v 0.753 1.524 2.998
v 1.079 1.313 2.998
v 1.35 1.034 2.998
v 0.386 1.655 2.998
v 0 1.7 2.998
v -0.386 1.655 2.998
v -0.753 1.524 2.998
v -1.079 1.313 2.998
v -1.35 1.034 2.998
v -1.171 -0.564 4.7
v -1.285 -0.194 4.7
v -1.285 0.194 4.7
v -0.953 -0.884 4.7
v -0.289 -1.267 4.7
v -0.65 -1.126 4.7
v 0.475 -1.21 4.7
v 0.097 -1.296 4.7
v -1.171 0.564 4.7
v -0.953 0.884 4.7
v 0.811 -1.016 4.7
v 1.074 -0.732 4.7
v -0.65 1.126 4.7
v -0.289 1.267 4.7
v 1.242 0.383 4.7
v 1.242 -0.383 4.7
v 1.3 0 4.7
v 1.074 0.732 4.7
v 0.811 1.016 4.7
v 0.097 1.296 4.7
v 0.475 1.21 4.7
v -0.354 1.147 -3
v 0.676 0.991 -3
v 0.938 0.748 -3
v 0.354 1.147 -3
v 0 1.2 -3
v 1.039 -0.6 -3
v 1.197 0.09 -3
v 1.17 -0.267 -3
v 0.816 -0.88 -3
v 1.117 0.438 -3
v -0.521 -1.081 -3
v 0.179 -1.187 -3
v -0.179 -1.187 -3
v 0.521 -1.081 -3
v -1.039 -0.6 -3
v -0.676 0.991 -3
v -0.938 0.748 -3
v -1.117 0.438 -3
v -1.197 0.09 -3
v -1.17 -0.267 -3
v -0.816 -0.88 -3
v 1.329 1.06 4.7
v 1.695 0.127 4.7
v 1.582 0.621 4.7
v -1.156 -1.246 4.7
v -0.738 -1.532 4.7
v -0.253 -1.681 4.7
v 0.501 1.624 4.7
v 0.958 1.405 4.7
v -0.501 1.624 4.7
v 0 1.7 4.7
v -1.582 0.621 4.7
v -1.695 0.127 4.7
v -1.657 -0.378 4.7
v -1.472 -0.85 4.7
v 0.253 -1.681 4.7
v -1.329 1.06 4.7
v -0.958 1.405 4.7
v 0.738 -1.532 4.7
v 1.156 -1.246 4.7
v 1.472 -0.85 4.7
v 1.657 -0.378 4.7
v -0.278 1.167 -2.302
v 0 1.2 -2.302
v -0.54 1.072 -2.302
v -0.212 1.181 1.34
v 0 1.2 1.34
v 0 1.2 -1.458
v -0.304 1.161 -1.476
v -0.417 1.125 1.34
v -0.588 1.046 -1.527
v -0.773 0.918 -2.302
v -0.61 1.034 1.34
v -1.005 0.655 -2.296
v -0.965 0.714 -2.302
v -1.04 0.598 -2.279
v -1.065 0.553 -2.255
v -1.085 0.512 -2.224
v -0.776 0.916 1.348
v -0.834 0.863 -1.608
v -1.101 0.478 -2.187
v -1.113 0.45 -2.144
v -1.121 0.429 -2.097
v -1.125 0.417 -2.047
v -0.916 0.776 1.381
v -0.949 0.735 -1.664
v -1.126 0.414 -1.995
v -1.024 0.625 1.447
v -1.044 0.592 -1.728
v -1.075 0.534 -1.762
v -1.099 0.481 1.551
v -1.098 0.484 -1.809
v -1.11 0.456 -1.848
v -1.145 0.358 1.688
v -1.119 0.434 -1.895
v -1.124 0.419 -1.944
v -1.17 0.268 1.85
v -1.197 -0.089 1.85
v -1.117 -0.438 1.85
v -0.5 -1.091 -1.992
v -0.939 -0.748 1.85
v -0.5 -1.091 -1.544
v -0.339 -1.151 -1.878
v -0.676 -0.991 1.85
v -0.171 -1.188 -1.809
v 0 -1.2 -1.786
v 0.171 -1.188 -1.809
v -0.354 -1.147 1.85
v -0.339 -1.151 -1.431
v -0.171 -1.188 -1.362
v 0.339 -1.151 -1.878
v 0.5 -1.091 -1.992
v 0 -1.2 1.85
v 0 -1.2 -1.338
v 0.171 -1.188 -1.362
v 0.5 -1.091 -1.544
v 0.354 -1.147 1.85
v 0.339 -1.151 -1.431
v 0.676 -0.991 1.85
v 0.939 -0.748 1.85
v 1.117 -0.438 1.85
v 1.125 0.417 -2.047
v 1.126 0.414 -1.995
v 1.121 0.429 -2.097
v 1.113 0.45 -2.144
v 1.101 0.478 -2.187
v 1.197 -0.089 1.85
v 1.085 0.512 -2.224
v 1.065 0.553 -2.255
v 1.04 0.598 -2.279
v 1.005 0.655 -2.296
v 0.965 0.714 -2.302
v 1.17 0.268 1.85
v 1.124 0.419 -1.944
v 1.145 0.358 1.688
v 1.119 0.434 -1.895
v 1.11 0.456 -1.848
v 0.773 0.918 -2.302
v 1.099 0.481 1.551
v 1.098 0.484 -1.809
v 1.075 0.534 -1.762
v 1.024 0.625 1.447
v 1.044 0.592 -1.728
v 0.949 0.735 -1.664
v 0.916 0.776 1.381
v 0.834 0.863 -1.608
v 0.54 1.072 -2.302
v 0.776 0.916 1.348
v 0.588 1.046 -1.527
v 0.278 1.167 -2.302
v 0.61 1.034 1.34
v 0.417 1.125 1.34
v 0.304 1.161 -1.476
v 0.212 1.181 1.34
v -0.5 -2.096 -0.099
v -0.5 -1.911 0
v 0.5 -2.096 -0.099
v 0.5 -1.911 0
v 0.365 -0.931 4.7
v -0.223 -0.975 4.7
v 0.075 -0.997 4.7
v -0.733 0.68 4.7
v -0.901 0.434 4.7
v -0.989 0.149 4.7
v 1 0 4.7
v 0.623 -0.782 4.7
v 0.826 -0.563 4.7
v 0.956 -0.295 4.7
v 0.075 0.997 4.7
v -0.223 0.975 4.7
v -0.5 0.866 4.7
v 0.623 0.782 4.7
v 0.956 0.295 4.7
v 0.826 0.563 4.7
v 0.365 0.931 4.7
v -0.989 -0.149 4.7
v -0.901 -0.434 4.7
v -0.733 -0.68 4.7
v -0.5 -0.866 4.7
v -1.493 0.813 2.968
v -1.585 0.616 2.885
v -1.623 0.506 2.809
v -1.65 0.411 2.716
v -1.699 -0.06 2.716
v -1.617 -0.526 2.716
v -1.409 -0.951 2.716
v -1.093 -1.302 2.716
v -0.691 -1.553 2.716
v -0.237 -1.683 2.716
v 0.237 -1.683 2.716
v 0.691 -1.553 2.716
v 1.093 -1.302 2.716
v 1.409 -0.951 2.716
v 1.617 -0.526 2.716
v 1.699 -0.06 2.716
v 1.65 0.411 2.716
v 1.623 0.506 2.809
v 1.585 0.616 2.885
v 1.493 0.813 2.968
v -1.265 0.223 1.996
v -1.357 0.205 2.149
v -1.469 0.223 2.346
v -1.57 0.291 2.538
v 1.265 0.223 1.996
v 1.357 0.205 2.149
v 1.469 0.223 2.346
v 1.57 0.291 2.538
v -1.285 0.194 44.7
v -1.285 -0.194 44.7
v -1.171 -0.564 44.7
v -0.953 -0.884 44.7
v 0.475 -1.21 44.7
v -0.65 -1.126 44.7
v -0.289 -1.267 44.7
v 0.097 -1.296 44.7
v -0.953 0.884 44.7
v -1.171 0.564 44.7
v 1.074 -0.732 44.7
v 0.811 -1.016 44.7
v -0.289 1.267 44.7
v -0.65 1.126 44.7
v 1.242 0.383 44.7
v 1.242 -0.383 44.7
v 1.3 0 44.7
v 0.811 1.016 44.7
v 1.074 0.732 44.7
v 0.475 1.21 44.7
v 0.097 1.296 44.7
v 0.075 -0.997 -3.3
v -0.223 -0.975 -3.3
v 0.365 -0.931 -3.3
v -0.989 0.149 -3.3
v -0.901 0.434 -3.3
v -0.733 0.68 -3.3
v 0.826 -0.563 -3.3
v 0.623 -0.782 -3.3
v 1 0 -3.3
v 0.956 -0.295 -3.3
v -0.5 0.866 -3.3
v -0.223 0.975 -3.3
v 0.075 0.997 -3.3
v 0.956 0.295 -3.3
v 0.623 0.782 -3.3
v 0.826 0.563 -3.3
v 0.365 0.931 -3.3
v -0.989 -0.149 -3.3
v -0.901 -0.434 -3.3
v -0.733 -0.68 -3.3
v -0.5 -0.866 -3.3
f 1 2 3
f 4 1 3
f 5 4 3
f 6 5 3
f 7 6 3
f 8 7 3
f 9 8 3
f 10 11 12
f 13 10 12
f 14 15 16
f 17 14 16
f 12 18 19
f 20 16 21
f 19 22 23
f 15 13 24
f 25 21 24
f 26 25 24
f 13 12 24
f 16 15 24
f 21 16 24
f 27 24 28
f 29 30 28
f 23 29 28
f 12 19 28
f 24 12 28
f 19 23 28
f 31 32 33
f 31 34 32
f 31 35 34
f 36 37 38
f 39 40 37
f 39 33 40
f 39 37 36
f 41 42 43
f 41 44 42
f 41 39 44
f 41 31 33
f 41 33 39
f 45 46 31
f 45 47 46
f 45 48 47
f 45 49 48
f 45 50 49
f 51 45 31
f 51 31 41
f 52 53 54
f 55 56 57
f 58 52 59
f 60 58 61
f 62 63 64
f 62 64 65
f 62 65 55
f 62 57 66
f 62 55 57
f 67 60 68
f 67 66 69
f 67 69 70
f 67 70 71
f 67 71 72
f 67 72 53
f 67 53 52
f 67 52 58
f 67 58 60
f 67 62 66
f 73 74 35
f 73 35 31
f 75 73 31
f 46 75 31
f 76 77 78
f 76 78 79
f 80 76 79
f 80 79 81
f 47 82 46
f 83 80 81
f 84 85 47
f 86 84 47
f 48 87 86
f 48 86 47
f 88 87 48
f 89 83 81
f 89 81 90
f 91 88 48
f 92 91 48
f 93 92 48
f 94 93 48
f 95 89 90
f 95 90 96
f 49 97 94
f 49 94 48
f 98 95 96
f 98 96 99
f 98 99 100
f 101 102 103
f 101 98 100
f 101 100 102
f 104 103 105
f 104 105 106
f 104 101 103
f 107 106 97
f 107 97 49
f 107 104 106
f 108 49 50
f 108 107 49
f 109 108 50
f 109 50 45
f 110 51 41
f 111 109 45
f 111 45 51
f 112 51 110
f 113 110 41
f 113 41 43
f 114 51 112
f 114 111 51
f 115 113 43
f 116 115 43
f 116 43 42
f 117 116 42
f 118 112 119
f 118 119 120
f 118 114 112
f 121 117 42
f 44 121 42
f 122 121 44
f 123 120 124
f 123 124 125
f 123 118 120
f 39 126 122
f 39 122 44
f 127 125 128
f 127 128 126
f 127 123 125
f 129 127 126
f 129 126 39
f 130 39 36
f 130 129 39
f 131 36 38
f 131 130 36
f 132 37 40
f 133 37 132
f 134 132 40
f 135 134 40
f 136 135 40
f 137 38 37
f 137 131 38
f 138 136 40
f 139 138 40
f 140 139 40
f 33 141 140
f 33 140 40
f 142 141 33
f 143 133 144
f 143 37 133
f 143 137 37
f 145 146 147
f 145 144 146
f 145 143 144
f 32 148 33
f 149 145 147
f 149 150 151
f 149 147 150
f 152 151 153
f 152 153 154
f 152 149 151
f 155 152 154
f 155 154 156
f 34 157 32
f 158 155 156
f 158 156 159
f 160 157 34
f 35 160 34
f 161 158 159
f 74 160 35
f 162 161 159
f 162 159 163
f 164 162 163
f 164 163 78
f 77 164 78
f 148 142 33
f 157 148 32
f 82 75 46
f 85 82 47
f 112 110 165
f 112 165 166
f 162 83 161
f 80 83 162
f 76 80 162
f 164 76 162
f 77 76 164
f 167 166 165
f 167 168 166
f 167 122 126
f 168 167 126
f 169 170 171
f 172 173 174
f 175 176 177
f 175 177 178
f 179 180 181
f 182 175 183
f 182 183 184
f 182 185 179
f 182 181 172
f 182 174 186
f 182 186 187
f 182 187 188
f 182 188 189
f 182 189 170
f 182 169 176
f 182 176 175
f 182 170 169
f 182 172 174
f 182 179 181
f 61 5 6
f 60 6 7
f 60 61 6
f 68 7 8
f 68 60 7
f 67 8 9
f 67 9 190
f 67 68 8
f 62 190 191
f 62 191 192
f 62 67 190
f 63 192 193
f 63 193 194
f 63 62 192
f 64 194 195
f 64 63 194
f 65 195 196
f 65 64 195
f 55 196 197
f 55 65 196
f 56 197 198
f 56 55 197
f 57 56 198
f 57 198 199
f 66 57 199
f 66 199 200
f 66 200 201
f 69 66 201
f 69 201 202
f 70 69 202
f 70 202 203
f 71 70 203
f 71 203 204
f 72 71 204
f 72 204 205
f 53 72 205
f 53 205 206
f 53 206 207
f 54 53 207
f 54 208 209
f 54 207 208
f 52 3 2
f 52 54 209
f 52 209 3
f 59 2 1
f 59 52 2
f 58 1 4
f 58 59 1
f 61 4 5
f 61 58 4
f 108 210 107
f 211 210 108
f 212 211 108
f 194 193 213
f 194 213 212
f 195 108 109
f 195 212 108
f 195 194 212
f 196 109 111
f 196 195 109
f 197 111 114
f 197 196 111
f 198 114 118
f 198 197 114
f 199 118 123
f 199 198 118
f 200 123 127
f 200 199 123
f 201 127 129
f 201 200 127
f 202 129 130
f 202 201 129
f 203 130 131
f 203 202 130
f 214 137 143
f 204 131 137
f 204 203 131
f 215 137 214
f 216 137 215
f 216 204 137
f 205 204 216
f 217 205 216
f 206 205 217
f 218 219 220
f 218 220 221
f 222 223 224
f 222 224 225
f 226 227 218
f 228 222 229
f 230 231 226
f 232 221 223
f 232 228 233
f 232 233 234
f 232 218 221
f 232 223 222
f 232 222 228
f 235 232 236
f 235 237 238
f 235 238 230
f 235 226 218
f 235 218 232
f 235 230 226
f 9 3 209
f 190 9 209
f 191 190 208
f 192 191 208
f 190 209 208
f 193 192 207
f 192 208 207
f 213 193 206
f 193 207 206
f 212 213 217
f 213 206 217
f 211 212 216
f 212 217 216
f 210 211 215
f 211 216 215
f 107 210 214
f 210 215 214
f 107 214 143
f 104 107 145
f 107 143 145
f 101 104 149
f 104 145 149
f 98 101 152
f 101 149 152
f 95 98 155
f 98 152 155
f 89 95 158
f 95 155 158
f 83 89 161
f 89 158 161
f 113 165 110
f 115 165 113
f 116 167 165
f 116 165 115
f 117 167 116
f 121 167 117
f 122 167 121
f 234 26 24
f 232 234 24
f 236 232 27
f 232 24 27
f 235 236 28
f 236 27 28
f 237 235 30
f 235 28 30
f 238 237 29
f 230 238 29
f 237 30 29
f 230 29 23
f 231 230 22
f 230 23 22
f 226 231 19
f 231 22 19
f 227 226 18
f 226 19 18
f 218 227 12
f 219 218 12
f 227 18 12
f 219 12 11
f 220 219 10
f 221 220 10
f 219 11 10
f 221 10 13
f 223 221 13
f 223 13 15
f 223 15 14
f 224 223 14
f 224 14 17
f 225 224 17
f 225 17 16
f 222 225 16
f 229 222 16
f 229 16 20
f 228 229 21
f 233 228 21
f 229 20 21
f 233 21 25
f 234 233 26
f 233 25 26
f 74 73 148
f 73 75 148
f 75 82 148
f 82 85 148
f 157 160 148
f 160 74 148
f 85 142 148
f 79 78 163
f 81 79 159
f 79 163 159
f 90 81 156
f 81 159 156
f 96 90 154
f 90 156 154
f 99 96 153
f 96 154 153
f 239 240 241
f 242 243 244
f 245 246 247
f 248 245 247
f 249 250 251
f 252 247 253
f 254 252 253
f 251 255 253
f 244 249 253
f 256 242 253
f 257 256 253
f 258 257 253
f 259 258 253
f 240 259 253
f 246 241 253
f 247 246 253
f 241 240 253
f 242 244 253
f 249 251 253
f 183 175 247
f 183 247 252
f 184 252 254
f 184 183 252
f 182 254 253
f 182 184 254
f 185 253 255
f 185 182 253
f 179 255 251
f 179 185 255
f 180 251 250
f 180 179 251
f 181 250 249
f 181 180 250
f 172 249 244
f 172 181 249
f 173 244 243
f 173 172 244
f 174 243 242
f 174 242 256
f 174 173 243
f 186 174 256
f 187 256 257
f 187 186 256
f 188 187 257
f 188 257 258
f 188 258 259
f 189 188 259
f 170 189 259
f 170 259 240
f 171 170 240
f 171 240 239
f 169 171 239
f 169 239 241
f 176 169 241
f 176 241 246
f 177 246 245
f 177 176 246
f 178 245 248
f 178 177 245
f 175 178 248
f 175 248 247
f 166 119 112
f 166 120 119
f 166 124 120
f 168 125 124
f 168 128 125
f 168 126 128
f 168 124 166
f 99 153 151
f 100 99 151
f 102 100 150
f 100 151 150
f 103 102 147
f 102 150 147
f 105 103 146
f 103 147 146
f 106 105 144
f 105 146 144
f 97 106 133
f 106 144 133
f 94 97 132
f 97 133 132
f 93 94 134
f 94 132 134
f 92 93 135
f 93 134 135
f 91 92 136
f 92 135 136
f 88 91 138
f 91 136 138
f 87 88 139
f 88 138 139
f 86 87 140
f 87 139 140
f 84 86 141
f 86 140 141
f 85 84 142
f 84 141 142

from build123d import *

# Parameters (mm, degrees)
F3_DEPTH      = 1.701
F3_DEPTH_BACK = 1.701
F5_DEPTH      = 0.5
F6_R          = 1
F7_DEPTH      = 8
F6_R_2        = 1.3
F8_DEPTH      = 40


with BuildPart() as f1:
    # F0 (on Right) → F1 (revolve)
    with BuildSketch(Plane.YZ):
        Polygon((0, 4.7), (0, -3), (1.2, -3), (1.2, 1.85), (1.7, 2.7160254038), (1.7, 4.7), align=None)
    revolve(axis=Axis((0, 0, 0.85), (0, 0, 1)))

    # F2 (on Right) → F3 (cut, two sides)
    with BuildSketch(Plane.YZ) as f3_sk:
        with BuildLine():
            Line((2.1899155108, 1.3396641007), (2.1899155108, 2.9980324907))
            Line((2.1899155108, 2.9980324907), (1.033622073, 2.9980324907))
            ThreePointArc((1.033622073, 2.9980324907), (0.204437878, 2.1688482957), (1.033622073, 1.3396641007))
            Line((1.033622073, 1.3396641007), (2.1899155108, 1.3396641007))
        make_face()
        with BuildLine():
            Line((0.7138770978, -2.3019161758), (1.8247701228, -2.3019161758))
            Line((1.8247701228, -2.3019161758), (1.8247701228, -1.1815773513))
            Line((1.8247701228, -1.1815773513), (0.5923490578, -1.7276335925))
            ThreePointArc((0.5923490578, -1.7276335925), (0.4203768635, -2.064025857), (0.7138770978, -2.3019161758))
        make_face()
    extrude(amount=F3_DEPTH, mode=Mode.SUBTRACT)
    extrude(f3_sk.sketch, amount=-F3_DEPTH_BACK, mode=Mode.SUBTRACT)

    # F4 (on Right) → F5 (join, symmetric)
    with BuildSketch(Plane.YZ):
        Polygon((-2.0963268337, -0.0985121634), (-0.7626931765, -2.6096533984), (-0.7626931765, -2.1618730389), (-1.9108351476, 0), align=None)
    extrude(amount=F5_DEPTH, both=True)


with BuildPart() as f7:
    # F6 (on face) → F7 (new body)
    with BuildSketch(Plane.XY.offset(4.7)):
        Circle(F6_R)
    extrude(amount=-F7_DEPTH)


with BuildPart() as f8:
    # F6 (on face) → F8 (new body)
    with BuildSketch(Plane.XY.offset(4.7)):
        Circle(F6_R_2)
        Circle(F6_R, mode=Mode.SUBTRACT)
        Circle(F6_R)
    extrude(amount=F8_DEPTH)


solid = Compound([f1.part, f7.part, f8.part])
